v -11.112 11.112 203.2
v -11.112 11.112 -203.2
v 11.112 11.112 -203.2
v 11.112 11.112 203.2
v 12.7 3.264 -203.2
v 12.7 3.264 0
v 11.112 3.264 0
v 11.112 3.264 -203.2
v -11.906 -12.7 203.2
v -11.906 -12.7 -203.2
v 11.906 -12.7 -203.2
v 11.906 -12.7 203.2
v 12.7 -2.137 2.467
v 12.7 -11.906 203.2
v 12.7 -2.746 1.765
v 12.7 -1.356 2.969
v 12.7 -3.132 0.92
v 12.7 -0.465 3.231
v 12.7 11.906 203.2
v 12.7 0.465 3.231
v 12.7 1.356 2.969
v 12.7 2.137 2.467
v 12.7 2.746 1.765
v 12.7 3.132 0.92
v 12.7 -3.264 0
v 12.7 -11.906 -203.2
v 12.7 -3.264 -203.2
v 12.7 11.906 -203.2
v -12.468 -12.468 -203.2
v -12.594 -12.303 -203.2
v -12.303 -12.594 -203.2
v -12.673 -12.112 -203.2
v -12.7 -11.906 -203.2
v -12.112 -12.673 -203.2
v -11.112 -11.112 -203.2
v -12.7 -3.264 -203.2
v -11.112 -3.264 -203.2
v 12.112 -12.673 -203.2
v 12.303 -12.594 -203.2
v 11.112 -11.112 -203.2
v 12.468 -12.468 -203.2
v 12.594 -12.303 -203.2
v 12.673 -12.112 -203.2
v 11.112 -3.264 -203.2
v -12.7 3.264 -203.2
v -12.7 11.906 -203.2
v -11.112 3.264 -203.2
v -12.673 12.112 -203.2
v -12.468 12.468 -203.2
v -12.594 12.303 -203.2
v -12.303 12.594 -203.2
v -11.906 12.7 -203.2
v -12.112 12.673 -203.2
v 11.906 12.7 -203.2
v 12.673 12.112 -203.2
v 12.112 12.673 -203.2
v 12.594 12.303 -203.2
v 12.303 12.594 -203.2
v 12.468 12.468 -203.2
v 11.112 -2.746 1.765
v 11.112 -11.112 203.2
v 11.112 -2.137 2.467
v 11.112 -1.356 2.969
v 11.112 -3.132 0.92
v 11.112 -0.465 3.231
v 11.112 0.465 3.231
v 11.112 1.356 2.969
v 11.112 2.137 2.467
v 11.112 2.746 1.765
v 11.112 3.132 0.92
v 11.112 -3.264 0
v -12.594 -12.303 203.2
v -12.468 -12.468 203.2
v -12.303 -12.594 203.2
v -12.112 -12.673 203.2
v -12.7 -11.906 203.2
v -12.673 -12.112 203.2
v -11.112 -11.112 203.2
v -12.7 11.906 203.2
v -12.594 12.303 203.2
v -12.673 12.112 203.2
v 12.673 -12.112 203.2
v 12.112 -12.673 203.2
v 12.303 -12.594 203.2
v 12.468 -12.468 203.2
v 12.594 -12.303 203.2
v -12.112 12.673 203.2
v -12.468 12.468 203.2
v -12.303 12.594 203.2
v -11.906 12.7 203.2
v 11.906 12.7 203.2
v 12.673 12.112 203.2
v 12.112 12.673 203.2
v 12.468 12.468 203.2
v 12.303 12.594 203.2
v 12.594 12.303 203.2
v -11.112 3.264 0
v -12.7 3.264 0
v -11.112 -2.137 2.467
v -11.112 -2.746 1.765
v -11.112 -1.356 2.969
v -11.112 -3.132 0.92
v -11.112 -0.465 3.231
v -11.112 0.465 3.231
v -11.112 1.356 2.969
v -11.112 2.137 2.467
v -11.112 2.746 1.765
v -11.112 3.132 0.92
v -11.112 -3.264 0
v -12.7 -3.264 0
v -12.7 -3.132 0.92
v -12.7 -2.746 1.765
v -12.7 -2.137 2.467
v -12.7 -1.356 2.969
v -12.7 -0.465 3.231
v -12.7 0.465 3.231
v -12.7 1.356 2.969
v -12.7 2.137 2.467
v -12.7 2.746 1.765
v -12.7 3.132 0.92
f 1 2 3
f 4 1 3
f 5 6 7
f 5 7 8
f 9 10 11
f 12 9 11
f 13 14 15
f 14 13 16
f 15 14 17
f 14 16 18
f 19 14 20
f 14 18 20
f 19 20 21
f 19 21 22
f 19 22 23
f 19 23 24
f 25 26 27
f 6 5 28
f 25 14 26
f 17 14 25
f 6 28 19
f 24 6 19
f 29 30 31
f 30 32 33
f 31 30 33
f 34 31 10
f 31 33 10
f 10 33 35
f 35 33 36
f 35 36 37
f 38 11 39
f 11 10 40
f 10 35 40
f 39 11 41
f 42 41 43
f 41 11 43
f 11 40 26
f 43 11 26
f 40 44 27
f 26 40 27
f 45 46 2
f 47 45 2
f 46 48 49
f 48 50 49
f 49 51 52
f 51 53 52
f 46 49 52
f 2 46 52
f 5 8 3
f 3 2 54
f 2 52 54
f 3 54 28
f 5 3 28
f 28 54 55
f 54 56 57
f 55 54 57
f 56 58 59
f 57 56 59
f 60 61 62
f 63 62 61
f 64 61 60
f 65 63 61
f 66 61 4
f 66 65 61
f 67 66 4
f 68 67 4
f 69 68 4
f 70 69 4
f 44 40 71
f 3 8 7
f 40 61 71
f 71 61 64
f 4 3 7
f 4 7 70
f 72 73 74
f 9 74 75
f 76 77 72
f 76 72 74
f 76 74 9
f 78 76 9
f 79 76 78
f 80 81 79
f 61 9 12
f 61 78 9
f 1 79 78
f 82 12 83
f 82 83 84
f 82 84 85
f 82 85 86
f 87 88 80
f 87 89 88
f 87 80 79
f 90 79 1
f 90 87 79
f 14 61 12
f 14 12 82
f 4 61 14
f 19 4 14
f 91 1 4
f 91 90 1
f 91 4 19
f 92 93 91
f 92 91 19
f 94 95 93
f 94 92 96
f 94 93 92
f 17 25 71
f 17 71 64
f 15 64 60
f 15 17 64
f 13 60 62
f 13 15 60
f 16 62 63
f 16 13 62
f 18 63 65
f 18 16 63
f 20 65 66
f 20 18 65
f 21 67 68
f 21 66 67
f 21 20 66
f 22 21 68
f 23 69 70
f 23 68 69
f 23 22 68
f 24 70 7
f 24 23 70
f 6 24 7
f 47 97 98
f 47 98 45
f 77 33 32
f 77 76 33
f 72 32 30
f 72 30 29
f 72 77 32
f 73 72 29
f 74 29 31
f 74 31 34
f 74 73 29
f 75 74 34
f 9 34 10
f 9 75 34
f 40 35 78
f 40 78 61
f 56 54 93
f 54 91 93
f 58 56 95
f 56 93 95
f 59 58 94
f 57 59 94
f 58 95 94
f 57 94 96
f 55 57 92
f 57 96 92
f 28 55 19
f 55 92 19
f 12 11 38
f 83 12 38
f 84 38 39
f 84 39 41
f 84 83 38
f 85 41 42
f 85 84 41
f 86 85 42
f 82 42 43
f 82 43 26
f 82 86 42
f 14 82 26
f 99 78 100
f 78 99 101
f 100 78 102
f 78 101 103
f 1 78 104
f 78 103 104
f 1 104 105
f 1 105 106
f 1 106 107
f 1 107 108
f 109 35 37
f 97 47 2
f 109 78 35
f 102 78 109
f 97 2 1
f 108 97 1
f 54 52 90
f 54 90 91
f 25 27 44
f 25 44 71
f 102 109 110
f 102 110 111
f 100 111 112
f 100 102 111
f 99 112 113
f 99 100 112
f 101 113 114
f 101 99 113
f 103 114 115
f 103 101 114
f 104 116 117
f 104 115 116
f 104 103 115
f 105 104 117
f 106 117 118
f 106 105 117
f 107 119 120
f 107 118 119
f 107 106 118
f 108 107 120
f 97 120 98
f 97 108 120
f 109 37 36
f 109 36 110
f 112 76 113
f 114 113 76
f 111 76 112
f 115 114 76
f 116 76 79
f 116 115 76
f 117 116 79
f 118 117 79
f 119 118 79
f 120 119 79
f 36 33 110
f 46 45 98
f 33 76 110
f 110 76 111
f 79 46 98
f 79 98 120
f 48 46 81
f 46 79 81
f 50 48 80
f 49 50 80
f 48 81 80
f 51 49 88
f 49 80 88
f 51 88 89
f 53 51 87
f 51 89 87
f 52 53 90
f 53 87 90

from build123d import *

# Parameters (mm, degrees)
BOSS_EXTRUDE1_DEPTH      = 203.2
BOSS_EXTRUDE1_DEPTH_BACK = 203.2
SKETCH1_W                = 25.4
SKETCH1_H                = 25.4
SKETCH1_W_2              = 22.225
SKETCH1_H_2              = 22.225
FILLET1_R                = 0.79375
CUT_EXTRUDE1_DEPTH       = 206.174779152


with BuildPart() as part:
    # Sketch1 → Boss-Extrude1 (new, two sides: drawn at the far end of the back side and taken through both)
    with BuildSketch(Plane.XY.offset(-BOSS_EXTRUDE1_DEPTH_BACK)):
        Rectangle(SKETCH1_W, SKETCH1_H)
        Rectangle(SKETCH1_W_2, SKETCH1_H_2, mode=Mode.SUBTRACT)
    extrude(amount=BOSS_EXTRUDE1_DEPTH + BOSS_EXTRUDE1_DEPTH_BACK)

    # Fillet1
    fillet1_edges = [part.edges().sort_by_distance(p)[0] for p in [
        (12.7, -12.7, 0),
        (-12.7, -12.7, 0),
        (-12.7, 12.7, 0),
        (12.7, 12.7, 0),
    ]]
    fillet(fillet1_edges, radius=FILLET1_R)

    # Sketch3 → Cut-Extrude1 (cut, through all)
    with BuildSketch(Plane(origin=(12.7, 0, 0), x_dir=(0, 0, -1), z_dir=(1, 0, 0))):
        with BuildLine():
            Line((0, 3.2639), (203.2, 3.2639))
            ThreePointArc((203.2, 3.2639), (206.4639, 0), (203.2, -3.2639))
            Line((203.2, -3.2639), (0, -3.2639))
            ThreePointArc((0, -3.2639), (-3.2639, 0), (0, 3.2639))
        make_face()
    extrude(amount=-CUT_EXTRUDE1_DEPTH, mode=Mode.SUBTRACT)


solid = part.part
